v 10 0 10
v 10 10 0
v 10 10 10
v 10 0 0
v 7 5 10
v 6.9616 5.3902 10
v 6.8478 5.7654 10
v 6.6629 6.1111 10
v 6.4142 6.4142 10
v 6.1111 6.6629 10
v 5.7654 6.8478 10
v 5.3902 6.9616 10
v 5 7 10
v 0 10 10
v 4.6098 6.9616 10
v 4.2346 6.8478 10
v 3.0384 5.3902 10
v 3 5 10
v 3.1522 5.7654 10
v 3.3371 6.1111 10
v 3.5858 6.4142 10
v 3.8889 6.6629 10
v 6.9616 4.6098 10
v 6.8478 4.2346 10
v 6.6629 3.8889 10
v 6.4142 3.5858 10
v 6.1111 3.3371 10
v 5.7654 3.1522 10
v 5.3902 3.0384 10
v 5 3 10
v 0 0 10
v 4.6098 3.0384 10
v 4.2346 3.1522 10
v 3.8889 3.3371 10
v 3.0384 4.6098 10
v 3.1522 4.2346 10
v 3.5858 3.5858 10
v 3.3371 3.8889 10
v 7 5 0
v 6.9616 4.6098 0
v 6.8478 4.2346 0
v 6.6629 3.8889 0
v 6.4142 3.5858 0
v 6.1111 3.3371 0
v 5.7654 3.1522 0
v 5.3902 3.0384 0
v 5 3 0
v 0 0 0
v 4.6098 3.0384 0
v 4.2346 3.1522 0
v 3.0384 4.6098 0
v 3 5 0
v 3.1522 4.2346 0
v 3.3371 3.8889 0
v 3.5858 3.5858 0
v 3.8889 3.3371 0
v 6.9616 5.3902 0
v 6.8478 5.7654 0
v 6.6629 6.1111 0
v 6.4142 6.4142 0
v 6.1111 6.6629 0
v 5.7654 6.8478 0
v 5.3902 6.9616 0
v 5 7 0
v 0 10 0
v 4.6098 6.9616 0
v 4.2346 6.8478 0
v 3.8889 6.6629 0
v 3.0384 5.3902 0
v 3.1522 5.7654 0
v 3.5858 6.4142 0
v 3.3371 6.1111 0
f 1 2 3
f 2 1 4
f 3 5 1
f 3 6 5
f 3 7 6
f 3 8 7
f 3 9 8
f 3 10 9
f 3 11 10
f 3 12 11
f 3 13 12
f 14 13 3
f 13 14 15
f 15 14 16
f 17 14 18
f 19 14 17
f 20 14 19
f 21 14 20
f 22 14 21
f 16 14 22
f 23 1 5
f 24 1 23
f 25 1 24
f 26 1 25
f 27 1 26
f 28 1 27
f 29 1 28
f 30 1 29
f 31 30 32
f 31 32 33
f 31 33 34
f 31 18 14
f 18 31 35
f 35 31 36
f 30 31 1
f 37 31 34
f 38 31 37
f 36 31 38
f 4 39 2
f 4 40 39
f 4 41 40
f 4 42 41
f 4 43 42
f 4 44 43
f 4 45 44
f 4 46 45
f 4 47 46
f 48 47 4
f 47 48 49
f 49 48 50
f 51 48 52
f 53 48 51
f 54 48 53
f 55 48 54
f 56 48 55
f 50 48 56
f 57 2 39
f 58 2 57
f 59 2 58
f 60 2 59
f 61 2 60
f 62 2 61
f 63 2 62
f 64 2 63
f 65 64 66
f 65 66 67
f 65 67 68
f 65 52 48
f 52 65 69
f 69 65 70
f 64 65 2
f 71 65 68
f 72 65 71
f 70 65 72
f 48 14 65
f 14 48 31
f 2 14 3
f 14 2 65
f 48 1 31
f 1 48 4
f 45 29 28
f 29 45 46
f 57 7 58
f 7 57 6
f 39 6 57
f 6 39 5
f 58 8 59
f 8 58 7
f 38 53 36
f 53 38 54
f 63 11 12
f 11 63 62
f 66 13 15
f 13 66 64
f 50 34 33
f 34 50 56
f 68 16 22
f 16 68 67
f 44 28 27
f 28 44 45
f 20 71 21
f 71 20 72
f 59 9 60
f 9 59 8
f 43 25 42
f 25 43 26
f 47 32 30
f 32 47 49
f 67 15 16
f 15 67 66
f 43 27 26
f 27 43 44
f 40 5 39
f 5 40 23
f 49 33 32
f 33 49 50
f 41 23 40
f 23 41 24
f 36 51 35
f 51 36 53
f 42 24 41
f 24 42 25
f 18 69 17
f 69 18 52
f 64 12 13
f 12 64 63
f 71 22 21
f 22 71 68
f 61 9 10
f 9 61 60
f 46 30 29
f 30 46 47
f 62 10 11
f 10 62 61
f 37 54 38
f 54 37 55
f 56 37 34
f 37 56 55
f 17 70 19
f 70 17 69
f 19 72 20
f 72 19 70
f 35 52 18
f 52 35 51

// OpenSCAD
// Corpus model: a plate with a cylindrical through-hole.
difference() {
    cube(10);
    translate([5, 5, -1]) cylinder(h = 12, r = 2, $fn = 32);
}
